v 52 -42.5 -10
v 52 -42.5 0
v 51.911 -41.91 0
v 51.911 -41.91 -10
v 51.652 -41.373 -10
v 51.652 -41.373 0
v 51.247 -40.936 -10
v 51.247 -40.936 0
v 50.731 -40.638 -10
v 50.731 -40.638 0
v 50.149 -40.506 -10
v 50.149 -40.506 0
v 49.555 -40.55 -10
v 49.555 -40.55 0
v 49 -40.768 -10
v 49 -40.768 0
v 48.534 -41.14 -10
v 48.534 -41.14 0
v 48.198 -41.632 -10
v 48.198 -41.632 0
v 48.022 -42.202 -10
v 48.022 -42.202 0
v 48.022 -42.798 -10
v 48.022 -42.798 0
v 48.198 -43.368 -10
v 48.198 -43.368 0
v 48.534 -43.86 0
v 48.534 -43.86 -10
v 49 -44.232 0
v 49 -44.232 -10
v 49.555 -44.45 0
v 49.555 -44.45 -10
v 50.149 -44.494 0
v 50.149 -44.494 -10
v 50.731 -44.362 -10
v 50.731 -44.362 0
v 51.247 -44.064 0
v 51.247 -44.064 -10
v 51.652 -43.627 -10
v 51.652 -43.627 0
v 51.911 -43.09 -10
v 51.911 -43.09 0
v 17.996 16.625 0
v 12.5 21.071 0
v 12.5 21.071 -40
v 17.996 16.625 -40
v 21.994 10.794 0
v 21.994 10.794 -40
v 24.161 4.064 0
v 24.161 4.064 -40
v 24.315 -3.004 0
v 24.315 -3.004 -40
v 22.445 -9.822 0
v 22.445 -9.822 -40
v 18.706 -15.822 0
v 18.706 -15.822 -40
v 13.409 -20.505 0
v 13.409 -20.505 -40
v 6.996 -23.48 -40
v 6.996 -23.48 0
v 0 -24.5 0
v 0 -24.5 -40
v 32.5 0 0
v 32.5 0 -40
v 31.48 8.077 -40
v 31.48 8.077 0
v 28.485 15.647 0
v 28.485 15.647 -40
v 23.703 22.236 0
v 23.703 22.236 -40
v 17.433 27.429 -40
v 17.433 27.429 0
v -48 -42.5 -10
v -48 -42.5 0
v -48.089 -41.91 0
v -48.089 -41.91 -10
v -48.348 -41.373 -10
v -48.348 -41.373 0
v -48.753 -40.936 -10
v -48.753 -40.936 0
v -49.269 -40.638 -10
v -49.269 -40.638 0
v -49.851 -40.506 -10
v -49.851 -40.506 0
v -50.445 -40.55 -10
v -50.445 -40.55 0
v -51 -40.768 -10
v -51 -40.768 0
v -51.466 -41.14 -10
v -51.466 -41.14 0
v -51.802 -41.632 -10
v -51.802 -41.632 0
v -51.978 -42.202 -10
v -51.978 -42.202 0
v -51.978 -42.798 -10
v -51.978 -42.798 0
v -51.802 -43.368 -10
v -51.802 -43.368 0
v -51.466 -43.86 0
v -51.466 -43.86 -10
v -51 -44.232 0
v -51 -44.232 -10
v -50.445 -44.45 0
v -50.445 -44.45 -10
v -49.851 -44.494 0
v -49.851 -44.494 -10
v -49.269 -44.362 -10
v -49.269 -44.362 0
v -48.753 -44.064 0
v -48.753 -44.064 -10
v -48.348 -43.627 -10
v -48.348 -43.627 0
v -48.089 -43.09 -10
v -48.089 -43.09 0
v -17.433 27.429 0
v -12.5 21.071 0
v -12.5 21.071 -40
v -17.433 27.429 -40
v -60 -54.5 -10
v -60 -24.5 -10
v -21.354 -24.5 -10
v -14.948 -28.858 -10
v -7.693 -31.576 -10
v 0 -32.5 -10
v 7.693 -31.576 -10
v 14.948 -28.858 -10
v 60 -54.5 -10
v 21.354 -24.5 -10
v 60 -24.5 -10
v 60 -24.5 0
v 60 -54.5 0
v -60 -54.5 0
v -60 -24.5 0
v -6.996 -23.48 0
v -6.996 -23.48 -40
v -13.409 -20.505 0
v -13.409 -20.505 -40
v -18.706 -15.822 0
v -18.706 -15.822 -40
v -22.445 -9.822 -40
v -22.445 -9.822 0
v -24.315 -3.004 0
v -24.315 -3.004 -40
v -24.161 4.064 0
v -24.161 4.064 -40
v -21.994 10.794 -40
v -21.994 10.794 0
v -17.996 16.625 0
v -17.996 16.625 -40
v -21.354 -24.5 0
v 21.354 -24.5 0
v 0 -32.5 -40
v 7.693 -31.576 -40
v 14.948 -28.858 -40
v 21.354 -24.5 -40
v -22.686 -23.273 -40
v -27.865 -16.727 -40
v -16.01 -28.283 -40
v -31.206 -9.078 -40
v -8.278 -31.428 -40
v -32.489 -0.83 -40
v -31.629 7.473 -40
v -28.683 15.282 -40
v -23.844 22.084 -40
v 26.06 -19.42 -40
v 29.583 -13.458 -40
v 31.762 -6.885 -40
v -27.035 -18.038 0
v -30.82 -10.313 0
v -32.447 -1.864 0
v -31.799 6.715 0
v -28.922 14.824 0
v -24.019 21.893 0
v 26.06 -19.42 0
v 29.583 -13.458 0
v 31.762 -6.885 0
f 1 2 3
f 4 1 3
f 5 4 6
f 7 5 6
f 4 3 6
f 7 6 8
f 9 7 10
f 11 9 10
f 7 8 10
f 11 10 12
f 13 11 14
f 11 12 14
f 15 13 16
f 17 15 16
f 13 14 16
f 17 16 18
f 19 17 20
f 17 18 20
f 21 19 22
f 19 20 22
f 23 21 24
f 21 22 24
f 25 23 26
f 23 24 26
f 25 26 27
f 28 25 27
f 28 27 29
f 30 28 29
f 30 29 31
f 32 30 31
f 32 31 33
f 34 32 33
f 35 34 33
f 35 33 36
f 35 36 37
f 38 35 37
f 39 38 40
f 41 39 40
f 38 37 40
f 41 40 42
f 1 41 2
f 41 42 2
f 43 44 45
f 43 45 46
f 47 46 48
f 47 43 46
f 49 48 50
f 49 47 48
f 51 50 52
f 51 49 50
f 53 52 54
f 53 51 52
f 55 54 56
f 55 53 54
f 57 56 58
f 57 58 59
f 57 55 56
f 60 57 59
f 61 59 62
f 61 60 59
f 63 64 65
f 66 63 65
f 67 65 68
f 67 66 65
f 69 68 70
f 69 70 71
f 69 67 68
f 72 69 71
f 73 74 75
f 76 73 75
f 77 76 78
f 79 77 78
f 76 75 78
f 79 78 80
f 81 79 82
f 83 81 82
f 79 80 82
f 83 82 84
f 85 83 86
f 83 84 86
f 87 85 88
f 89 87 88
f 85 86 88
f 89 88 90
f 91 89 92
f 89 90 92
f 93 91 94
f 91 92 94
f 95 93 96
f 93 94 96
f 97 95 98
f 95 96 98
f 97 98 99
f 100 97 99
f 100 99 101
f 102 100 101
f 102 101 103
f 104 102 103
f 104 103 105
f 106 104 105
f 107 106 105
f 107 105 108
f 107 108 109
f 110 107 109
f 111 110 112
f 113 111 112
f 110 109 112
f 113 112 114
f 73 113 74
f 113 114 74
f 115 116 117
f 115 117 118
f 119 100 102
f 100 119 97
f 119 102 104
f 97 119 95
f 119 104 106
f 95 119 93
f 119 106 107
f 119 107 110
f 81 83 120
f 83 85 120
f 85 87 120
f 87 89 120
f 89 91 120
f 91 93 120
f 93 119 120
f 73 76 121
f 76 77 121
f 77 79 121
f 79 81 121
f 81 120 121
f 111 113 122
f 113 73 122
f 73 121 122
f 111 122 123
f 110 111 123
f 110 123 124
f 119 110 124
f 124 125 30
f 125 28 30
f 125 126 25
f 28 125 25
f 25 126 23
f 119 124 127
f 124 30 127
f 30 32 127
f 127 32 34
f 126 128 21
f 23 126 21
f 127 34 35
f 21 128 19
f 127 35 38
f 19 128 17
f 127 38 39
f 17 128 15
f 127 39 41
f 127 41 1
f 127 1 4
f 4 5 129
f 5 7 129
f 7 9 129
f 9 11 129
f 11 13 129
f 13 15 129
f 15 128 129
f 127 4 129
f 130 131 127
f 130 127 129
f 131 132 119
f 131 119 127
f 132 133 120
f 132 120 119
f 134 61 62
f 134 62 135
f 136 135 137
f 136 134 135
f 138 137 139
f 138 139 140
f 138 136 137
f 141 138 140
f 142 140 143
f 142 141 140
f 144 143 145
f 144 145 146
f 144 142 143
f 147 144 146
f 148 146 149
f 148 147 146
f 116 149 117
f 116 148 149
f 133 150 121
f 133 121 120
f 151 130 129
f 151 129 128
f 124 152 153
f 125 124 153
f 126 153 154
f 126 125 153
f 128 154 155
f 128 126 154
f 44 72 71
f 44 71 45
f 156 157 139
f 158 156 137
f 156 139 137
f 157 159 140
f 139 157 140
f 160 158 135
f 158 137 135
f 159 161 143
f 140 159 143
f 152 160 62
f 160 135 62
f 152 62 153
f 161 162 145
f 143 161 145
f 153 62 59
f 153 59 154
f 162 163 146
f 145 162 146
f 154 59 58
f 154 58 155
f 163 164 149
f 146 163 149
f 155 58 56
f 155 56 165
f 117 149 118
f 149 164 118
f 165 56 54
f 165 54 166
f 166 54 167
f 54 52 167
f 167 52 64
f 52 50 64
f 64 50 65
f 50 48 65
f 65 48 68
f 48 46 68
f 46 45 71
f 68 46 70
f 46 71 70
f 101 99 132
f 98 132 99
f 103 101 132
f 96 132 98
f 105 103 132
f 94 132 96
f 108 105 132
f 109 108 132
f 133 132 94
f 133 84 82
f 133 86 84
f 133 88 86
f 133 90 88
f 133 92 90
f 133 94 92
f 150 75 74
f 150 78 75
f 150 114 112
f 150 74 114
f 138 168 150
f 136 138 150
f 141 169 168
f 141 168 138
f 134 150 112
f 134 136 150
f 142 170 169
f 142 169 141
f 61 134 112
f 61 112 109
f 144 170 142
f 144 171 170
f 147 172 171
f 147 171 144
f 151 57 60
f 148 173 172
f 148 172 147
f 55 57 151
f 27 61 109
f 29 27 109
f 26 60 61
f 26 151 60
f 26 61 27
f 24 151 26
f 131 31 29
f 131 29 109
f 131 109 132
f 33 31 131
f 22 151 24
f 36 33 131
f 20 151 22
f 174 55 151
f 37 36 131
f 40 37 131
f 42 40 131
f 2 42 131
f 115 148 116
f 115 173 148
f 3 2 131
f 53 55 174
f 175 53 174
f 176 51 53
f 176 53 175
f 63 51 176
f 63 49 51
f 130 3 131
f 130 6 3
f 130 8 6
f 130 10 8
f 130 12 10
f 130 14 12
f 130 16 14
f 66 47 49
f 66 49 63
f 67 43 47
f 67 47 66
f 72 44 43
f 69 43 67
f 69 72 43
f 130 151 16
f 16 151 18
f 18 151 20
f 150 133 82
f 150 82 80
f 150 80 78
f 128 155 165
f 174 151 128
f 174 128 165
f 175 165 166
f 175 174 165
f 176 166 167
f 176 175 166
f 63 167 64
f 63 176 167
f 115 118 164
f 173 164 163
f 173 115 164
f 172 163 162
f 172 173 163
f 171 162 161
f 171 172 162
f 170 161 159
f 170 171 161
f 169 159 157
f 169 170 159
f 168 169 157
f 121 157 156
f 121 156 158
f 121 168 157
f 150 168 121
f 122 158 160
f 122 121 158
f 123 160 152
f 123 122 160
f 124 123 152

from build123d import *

# Parameters (mm, degrees)
F1_DEPTH = 40
F0_R     = 2
F2_DEPTH = 10


with BuildPart() as f1:
    # F0 (on Top) → F1 (new body)
    with BuildSketch(Plane.XY):
        with BuildLine():
            Line((-21.3541565041, -24.5), (0, -24.5))
            ThreePointArc((0, -24.5), (-23.6272833171, -6.4808551176), (-12.5, 21.0713075057))
            Line((-12.5, 21.0713075057), (-17.433109084, 27.4287569471))
            ThreePointArc((-17.433109084, 27.4287569471), (-32.4077451, 2.4470507823), (-21.3541565041, -24.5))
        make_face()
        with BuildLine():
            ThreePointArc((12.5, 21.0713075057), (21.289668856, 12.124355653), (24.5, 0))
            ThreePointArc((24.5, 0), (17.3241161391, -17.3241161391), (0, -24.5))
            Line((0, -24.5), (21.3541565041, -24.5))
            ThreePointArc((21.3541565041, -24.5), (29.582596965, -13.4580814684), (32.5, 0))
            ThreePointArc((32.5, 0), (28.4853124016, 15.6472674095), (17.433109084, 27.4287569471))
            Line((17.433109084, 27.4287569471), (12.5, 21.0713075057))
        make_face()
        with BuildLine():
            Line((21.3541565041, -24.5), (0, -24.5))
            Line((0, -24.5), (0, -32.5))
            ThreePointArc((0, -32.5), (11.401754251, -30.4343555871), (21.3541565041, -24.5))
        make_face()
        with BuildLine():
            Line((0, -32.5), (0, -24.5))
            Line((0, -24.5), (-21.3541565041, -24.5))
            ThreePointArc((-21.3541565041, -24.5), (-11.401754251, -30.4343555871), (0, -32.5))
        make_face()
    extrude(amount=-F1_DEPTH)

    # F0 (on Top) → F2 (join)
    with BuildSketch(Plane.XY):
        with BuildLine():
            Line((0, -54.5), (0, -32.5))
            ThreePointArc((0, -32.5), (-11.401754251, -30.4343555871), (-21.3541565041, -24.5))
            Line((-21.3541565041, -24.5), (-60, -24.5))
            Line((-60, -24.5), (-60, -54.5))
            Line((-60, -54.5), (0, -54.5))
        make_face()
        with Locations((-50.0000007451, -42.5000099838)):
            Circle(F0_R, mode=Mode.SUBTRACT)
        with BuildLine():
            ThreePointArc((21.3541565041, -24.5), (11.401754251, -30.4343555871), (0, -32.5))
            Line((0, -32.5), (0, -54.5))
            Line((0, -54.5), (60, -54.5))
            Line((60, -54.5), (60, -24.5))
            Line((60, -24.5), (21.3541565041, -24.5))
        make_face()
        with Locations((50.0000007451, -42.5000099838)):
            Circle(F0_R, mode=Mode.SUBTRACT)
    extrude(amount=-F2_DEPTH)


solid = f1.part
